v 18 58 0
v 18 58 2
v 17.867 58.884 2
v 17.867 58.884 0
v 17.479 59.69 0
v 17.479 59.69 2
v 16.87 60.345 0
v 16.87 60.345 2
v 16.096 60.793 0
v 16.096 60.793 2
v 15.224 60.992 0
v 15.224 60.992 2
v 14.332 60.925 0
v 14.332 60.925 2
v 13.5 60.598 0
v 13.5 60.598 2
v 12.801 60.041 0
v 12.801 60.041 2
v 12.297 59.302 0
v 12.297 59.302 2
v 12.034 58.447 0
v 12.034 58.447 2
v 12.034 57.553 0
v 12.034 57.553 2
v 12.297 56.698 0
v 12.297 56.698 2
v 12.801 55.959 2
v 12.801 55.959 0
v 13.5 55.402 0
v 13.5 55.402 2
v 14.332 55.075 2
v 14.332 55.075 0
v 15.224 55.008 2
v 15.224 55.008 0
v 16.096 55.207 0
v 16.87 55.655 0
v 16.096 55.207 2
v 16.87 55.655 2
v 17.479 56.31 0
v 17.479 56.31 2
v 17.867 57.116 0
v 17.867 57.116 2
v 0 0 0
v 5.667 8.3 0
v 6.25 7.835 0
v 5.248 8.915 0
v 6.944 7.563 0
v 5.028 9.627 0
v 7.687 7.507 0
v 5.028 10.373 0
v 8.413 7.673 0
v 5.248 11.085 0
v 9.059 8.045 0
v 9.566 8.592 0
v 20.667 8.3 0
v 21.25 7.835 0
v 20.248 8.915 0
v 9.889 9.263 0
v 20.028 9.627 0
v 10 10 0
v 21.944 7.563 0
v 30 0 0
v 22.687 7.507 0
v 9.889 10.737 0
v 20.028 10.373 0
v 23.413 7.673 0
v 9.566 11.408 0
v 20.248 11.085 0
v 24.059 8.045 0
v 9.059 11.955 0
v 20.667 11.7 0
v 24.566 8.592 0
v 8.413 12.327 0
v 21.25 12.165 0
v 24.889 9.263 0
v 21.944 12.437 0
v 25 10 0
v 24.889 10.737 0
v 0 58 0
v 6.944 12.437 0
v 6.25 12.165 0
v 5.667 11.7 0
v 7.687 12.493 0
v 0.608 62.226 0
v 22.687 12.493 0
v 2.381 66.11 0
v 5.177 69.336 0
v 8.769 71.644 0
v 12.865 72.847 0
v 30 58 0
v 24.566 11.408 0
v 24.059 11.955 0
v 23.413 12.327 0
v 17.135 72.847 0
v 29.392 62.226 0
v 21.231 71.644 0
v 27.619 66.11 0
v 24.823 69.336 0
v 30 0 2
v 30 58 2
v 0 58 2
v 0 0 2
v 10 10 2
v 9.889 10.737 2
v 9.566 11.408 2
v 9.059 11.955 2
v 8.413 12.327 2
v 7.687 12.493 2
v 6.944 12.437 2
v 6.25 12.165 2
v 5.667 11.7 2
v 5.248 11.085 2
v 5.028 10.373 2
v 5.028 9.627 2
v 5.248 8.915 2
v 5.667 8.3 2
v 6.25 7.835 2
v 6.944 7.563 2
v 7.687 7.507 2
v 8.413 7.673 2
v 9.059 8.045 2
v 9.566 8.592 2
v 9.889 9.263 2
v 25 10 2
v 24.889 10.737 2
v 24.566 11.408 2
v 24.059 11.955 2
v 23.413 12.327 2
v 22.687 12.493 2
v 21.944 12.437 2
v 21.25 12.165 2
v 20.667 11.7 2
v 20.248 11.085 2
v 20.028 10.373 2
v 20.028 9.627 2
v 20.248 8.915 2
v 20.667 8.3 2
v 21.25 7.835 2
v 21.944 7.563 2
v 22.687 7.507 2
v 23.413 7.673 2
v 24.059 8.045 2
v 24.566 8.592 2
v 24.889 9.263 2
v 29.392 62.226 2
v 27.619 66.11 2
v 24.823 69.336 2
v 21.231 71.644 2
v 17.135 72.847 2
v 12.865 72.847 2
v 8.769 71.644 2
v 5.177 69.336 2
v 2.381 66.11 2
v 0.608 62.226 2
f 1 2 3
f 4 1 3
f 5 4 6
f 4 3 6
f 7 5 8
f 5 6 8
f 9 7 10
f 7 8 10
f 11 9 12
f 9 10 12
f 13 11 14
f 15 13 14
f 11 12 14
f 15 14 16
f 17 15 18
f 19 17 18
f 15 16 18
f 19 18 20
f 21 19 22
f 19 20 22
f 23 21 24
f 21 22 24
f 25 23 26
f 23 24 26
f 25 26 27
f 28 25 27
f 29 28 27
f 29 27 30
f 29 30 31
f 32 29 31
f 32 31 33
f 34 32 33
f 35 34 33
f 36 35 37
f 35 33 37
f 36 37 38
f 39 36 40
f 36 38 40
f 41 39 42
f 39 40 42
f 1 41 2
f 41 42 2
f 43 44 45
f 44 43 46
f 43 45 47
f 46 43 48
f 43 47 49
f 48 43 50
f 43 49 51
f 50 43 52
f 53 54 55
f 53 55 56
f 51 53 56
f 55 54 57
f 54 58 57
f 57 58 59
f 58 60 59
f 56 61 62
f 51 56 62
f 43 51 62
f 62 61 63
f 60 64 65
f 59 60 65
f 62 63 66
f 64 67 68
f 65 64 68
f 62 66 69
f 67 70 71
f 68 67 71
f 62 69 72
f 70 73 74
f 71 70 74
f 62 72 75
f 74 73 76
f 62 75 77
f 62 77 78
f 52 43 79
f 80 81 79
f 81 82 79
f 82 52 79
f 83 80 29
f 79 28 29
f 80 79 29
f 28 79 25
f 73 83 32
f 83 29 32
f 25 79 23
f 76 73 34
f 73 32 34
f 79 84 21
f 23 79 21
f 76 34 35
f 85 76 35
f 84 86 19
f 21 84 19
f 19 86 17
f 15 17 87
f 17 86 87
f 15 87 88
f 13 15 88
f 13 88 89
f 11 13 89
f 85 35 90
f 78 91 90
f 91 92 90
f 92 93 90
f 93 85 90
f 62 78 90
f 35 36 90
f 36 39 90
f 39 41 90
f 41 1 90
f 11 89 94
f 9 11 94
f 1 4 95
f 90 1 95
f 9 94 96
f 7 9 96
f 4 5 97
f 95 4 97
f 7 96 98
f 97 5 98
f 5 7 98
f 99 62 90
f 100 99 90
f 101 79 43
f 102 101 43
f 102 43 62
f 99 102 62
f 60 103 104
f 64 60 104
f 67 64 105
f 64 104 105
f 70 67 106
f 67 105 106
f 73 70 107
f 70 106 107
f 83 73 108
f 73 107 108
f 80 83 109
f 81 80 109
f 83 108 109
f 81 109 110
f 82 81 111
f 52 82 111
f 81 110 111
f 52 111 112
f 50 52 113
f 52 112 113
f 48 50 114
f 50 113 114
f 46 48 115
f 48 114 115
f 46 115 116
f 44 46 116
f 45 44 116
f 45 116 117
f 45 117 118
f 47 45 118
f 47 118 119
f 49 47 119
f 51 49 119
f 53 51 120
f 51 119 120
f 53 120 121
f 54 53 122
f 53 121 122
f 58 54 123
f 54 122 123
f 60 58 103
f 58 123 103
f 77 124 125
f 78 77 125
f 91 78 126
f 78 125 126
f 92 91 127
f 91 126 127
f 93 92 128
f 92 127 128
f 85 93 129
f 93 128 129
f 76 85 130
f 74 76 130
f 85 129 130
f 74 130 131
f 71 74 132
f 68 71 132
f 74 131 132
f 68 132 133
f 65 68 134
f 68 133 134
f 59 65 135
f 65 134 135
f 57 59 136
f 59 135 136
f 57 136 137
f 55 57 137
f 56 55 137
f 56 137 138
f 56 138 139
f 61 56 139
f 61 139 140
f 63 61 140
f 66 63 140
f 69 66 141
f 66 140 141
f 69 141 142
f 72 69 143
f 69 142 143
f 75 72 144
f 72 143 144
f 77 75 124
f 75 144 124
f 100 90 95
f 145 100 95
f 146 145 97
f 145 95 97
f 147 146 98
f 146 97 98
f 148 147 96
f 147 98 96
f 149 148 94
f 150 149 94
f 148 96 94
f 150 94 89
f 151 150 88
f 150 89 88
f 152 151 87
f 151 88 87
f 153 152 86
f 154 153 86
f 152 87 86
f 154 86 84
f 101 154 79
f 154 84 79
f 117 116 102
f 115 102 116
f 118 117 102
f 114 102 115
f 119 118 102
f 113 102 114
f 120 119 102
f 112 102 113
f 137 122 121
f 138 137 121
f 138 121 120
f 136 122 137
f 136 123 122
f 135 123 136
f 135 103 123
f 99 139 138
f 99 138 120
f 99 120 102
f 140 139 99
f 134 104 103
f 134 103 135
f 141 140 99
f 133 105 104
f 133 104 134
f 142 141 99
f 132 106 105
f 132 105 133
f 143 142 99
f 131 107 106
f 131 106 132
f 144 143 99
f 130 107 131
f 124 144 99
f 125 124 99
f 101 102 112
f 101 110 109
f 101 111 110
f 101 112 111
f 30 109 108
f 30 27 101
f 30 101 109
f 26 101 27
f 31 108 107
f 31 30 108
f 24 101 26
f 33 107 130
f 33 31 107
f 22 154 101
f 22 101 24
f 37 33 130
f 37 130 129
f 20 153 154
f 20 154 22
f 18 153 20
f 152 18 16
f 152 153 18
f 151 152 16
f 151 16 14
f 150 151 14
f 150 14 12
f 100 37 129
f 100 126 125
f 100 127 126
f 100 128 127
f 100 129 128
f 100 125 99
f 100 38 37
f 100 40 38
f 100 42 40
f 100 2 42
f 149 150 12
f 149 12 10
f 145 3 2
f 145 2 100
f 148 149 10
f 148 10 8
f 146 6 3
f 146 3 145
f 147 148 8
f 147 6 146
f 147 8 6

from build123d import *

# Parameters (mm, degrees)
BOSS_EXTRUDE1_DEPTH = 2
SKETCH2_R           = 2.5
SKETCH2_R_2         = 3
CUT_EXTRUDE1_DEPTH  = 2


with BuildPart() as part:
    # Sketch1 → Boss-Extrude1 (new body)
    with BuildSketch(Plane.XY):
        with BuildLine():
            Line((0, 0), (30, 0))
            Line((30, 0), (30, 58))
            ThreePointArc((30, 58), (15, 73), (0, 58))
            Line((0, 58), (0, 0))
        make_face()
    extrude(amount=BOSS_EXTRUDE1_DEPTH)

    # Sketch2 → Cut-Extrude1 (cut)
    with BuildSketch(Plane.XY.offset(2)):
        with Locations((7.5, 10)):
            Circle(SKETCH2_R)
        with Locations((15, 58)):
            Circle(SKETCH2_R_2)
        with Locations((22.5, 10)):
            Circle(SKETCH2_R)
    extrude(amount=-CUT_EXTRUDE1_DEPTH, mode=Mode.SUBTRACT)


solid = part.part
